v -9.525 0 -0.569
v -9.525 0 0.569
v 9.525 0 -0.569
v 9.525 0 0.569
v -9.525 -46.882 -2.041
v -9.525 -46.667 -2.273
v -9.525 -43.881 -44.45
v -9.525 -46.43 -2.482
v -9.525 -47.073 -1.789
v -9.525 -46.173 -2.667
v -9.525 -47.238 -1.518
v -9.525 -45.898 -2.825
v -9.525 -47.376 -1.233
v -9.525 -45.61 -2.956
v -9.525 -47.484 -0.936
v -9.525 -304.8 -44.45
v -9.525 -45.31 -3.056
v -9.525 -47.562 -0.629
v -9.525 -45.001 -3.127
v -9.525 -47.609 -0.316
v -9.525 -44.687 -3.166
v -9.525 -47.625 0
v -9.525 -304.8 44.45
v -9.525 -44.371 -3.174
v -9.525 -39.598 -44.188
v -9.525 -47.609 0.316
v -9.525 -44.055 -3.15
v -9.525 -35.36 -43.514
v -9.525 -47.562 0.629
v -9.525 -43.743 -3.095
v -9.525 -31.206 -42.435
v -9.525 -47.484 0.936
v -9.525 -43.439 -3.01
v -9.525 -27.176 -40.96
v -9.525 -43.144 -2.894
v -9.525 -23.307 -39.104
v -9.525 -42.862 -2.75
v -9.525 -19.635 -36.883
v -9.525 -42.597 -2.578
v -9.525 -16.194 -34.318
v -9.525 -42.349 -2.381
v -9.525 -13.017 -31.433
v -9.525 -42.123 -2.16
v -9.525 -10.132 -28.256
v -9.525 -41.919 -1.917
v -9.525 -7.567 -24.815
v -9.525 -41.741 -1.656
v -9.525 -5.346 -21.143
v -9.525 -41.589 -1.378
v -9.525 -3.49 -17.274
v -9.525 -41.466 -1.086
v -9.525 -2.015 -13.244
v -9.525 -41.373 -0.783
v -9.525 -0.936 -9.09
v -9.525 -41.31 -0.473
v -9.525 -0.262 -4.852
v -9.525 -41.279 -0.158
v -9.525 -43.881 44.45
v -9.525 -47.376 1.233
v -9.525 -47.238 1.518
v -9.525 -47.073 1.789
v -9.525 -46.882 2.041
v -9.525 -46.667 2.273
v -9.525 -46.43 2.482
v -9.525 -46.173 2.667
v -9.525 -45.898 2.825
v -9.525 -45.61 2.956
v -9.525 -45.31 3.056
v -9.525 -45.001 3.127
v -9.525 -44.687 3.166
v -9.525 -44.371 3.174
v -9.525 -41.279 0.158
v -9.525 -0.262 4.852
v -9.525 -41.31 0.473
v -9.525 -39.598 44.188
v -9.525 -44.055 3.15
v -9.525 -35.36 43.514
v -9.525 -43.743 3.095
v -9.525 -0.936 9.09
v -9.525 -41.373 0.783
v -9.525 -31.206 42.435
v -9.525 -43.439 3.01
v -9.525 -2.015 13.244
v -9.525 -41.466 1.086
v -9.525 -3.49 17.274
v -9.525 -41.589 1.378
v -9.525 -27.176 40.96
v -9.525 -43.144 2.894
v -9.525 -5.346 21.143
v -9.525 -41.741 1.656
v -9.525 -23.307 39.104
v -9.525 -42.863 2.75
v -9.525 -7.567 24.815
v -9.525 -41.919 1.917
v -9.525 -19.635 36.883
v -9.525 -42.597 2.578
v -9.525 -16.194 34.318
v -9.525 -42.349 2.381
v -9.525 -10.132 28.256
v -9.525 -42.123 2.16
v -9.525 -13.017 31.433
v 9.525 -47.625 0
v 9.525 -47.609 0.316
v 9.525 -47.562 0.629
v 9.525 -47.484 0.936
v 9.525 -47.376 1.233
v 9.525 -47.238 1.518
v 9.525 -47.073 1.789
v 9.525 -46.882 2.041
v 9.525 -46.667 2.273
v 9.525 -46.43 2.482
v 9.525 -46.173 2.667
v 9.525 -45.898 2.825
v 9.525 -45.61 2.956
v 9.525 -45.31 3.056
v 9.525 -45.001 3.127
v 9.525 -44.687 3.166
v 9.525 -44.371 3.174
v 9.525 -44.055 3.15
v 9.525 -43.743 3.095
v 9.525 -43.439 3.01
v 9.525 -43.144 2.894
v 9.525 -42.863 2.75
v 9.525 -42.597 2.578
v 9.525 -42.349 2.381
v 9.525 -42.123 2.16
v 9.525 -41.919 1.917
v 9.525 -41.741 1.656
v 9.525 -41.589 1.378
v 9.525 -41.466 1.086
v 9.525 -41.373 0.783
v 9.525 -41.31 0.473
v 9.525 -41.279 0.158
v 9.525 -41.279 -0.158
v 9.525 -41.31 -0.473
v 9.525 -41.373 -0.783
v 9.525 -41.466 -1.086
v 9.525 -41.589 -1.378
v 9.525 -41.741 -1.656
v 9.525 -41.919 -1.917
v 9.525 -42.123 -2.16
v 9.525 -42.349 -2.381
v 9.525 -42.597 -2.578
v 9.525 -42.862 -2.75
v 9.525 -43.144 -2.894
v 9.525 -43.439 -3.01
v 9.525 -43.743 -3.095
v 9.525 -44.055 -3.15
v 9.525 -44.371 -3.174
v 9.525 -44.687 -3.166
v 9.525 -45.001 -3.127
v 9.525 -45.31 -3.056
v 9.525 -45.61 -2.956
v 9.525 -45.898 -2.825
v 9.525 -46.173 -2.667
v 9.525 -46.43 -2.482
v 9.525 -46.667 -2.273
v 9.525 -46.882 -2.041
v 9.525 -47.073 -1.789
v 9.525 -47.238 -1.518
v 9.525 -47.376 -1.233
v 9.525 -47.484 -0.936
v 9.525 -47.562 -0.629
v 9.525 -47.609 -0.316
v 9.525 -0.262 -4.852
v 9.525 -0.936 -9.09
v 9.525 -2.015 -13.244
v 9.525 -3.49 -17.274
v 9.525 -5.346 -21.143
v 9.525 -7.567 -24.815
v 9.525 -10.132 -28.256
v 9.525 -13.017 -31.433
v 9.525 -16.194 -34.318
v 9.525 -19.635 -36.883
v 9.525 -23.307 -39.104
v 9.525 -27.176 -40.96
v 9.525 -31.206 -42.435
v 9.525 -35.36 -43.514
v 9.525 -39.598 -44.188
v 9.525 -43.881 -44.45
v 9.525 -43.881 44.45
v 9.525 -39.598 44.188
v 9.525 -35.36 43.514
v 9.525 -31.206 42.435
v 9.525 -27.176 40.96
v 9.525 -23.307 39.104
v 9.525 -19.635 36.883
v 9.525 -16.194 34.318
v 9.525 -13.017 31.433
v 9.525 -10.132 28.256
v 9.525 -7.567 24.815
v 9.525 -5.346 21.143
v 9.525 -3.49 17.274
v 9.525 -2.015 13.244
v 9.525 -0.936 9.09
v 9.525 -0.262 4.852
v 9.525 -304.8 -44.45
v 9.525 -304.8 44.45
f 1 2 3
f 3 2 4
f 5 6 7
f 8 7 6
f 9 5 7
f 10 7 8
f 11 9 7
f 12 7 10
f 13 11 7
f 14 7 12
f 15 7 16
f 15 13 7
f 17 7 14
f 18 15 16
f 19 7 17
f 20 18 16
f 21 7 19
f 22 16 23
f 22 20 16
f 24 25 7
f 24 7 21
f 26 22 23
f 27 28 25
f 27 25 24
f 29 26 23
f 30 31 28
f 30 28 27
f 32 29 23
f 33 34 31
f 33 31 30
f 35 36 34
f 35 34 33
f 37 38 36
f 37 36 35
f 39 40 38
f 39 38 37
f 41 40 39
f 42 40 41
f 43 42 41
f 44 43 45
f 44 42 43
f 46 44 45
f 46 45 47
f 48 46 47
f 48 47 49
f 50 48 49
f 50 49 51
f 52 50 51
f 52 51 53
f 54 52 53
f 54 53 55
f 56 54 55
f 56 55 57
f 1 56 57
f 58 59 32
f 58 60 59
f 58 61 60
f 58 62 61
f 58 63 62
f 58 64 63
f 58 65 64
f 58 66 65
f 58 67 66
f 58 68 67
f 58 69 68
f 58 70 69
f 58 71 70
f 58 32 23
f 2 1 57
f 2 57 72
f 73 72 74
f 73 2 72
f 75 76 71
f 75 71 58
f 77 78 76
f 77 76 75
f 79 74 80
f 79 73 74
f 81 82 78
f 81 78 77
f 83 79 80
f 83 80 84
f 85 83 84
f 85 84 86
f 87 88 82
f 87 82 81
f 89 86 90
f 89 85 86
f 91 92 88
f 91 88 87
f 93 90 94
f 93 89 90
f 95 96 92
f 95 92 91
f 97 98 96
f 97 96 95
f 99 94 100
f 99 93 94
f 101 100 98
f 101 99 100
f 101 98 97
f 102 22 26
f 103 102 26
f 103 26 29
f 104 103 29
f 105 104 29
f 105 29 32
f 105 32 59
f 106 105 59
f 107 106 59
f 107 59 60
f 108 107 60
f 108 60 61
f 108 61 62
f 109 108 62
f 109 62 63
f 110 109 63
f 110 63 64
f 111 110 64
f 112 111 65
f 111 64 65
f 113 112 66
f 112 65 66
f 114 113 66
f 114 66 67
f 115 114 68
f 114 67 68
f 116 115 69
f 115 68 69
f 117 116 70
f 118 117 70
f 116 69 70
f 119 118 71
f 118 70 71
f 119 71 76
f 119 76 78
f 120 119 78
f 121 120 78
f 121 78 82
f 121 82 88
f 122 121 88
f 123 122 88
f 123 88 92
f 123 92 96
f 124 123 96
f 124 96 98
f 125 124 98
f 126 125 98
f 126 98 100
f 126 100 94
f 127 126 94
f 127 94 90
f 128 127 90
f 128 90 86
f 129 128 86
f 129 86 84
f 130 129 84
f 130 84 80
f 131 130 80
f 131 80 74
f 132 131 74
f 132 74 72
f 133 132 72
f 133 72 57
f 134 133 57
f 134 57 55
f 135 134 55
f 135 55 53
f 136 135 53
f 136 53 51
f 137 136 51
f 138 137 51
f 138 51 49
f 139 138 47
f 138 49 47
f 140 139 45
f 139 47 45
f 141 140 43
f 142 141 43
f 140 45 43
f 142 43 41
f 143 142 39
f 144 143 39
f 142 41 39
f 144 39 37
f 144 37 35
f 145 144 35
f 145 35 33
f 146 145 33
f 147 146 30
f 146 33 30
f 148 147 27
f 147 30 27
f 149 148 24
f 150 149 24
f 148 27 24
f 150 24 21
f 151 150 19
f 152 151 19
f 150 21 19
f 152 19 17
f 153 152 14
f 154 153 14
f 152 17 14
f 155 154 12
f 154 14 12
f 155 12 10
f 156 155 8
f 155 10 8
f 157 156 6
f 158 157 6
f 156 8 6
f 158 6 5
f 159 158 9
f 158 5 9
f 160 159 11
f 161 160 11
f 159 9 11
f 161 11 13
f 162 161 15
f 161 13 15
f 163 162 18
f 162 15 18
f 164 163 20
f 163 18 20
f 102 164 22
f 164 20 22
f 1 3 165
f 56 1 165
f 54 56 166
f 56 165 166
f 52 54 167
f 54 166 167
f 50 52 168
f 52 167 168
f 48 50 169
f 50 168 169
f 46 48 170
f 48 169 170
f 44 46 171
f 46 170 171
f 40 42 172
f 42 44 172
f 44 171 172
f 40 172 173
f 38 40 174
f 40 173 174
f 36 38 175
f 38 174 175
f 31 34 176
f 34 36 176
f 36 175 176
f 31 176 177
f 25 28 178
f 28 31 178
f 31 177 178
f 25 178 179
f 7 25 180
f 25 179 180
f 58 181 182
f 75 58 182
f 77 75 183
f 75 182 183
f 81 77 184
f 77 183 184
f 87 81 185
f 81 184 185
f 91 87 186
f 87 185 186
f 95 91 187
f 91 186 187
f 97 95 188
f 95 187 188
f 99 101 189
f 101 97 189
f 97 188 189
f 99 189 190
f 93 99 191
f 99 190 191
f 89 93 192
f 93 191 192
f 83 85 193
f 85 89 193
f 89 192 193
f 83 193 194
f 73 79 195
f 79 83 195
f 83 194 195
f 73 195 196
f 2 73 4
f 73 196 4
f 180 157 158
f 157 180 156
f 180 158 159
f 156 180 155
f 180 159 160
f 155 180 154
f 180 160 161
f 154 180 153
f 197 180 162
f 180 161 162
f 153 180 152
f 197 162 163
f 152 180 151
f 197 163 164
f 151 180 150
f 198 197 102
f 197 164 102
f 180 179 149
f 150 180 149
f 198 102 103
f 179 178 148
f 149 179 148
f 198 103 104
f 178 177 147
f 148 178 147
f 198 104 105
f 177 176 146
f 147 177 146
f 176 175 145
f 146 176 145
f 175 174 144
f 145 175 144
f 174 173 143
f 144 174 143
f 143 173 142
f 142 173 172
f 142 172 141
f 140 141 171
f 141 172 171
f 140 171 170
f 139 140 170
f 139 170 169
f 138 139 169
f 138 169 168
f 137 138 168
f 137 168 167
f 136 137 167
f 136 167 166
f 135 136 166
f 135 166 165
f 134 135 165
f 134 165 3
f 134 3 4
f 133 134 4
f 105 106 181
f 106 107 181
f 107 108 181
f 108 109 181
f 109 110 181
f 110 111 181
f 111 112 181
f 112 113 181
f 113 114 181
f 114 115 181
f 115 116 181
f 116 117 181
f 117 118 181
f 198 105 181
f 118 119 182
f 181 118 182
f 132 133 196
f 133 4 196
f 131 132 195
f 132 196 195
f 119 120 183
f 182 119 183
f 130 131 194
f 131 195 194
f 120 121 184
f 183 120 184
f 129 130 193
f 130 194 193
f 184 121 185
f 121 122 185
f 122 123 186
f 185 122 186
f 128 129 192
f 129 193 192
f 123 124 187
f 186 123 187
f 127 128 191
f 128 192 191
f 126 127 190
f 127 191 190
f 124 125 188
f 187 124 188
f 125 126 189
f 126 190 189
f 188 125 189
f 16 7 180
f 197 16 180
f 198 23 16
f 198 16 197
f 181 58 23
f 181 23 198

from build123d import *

# Parameters (mm, degrees)
F0_W     = 19.05
F0_H     = 88.9
F1_DEPTH = 304.8
F3_D     = 6.35
F5_DEPTH = 19.051


with BuildPart() as f1:
    # F0 (on Front) → F1 (new body)
    with BuildSketch(Plane.XZ):
        Rectangle(F0_W, F0_H)
    extrude(amount=F1_DEPTH)

    # F3 (through all)
    with Locations(Plane.YZ.offset(9.525)):
        with Locations((-44.45, 0)):
            Hole(F3_D / 2)

    # F4 (on face) → F5 (cut, through all)
    with BuildSketch(Plane.YZ.offset(9.525)):
        with BuildLine():
            Line((0, -44.45), (0, -0.568558))
            ThreePointArc((0, -0.568558), (-13.016533, -31.433467), (-43.881442, -44.45))
            Line((-43.881442, -44.45), (0, -44.45))
        make_face()
        with BuildLine():
            Line((0, 44.45), (-43.881442, 44.45))
            ThreePointArc((-43.881442, 44.45), (-13.016533, 31.433467), (0, 0.568558))
            Line((0, 0.568558), (0, 44.45))
        make_face()
    extrude(amount=-F5_DEPTH, mode=Mode.SUBTRACT)


solid = f1.part
